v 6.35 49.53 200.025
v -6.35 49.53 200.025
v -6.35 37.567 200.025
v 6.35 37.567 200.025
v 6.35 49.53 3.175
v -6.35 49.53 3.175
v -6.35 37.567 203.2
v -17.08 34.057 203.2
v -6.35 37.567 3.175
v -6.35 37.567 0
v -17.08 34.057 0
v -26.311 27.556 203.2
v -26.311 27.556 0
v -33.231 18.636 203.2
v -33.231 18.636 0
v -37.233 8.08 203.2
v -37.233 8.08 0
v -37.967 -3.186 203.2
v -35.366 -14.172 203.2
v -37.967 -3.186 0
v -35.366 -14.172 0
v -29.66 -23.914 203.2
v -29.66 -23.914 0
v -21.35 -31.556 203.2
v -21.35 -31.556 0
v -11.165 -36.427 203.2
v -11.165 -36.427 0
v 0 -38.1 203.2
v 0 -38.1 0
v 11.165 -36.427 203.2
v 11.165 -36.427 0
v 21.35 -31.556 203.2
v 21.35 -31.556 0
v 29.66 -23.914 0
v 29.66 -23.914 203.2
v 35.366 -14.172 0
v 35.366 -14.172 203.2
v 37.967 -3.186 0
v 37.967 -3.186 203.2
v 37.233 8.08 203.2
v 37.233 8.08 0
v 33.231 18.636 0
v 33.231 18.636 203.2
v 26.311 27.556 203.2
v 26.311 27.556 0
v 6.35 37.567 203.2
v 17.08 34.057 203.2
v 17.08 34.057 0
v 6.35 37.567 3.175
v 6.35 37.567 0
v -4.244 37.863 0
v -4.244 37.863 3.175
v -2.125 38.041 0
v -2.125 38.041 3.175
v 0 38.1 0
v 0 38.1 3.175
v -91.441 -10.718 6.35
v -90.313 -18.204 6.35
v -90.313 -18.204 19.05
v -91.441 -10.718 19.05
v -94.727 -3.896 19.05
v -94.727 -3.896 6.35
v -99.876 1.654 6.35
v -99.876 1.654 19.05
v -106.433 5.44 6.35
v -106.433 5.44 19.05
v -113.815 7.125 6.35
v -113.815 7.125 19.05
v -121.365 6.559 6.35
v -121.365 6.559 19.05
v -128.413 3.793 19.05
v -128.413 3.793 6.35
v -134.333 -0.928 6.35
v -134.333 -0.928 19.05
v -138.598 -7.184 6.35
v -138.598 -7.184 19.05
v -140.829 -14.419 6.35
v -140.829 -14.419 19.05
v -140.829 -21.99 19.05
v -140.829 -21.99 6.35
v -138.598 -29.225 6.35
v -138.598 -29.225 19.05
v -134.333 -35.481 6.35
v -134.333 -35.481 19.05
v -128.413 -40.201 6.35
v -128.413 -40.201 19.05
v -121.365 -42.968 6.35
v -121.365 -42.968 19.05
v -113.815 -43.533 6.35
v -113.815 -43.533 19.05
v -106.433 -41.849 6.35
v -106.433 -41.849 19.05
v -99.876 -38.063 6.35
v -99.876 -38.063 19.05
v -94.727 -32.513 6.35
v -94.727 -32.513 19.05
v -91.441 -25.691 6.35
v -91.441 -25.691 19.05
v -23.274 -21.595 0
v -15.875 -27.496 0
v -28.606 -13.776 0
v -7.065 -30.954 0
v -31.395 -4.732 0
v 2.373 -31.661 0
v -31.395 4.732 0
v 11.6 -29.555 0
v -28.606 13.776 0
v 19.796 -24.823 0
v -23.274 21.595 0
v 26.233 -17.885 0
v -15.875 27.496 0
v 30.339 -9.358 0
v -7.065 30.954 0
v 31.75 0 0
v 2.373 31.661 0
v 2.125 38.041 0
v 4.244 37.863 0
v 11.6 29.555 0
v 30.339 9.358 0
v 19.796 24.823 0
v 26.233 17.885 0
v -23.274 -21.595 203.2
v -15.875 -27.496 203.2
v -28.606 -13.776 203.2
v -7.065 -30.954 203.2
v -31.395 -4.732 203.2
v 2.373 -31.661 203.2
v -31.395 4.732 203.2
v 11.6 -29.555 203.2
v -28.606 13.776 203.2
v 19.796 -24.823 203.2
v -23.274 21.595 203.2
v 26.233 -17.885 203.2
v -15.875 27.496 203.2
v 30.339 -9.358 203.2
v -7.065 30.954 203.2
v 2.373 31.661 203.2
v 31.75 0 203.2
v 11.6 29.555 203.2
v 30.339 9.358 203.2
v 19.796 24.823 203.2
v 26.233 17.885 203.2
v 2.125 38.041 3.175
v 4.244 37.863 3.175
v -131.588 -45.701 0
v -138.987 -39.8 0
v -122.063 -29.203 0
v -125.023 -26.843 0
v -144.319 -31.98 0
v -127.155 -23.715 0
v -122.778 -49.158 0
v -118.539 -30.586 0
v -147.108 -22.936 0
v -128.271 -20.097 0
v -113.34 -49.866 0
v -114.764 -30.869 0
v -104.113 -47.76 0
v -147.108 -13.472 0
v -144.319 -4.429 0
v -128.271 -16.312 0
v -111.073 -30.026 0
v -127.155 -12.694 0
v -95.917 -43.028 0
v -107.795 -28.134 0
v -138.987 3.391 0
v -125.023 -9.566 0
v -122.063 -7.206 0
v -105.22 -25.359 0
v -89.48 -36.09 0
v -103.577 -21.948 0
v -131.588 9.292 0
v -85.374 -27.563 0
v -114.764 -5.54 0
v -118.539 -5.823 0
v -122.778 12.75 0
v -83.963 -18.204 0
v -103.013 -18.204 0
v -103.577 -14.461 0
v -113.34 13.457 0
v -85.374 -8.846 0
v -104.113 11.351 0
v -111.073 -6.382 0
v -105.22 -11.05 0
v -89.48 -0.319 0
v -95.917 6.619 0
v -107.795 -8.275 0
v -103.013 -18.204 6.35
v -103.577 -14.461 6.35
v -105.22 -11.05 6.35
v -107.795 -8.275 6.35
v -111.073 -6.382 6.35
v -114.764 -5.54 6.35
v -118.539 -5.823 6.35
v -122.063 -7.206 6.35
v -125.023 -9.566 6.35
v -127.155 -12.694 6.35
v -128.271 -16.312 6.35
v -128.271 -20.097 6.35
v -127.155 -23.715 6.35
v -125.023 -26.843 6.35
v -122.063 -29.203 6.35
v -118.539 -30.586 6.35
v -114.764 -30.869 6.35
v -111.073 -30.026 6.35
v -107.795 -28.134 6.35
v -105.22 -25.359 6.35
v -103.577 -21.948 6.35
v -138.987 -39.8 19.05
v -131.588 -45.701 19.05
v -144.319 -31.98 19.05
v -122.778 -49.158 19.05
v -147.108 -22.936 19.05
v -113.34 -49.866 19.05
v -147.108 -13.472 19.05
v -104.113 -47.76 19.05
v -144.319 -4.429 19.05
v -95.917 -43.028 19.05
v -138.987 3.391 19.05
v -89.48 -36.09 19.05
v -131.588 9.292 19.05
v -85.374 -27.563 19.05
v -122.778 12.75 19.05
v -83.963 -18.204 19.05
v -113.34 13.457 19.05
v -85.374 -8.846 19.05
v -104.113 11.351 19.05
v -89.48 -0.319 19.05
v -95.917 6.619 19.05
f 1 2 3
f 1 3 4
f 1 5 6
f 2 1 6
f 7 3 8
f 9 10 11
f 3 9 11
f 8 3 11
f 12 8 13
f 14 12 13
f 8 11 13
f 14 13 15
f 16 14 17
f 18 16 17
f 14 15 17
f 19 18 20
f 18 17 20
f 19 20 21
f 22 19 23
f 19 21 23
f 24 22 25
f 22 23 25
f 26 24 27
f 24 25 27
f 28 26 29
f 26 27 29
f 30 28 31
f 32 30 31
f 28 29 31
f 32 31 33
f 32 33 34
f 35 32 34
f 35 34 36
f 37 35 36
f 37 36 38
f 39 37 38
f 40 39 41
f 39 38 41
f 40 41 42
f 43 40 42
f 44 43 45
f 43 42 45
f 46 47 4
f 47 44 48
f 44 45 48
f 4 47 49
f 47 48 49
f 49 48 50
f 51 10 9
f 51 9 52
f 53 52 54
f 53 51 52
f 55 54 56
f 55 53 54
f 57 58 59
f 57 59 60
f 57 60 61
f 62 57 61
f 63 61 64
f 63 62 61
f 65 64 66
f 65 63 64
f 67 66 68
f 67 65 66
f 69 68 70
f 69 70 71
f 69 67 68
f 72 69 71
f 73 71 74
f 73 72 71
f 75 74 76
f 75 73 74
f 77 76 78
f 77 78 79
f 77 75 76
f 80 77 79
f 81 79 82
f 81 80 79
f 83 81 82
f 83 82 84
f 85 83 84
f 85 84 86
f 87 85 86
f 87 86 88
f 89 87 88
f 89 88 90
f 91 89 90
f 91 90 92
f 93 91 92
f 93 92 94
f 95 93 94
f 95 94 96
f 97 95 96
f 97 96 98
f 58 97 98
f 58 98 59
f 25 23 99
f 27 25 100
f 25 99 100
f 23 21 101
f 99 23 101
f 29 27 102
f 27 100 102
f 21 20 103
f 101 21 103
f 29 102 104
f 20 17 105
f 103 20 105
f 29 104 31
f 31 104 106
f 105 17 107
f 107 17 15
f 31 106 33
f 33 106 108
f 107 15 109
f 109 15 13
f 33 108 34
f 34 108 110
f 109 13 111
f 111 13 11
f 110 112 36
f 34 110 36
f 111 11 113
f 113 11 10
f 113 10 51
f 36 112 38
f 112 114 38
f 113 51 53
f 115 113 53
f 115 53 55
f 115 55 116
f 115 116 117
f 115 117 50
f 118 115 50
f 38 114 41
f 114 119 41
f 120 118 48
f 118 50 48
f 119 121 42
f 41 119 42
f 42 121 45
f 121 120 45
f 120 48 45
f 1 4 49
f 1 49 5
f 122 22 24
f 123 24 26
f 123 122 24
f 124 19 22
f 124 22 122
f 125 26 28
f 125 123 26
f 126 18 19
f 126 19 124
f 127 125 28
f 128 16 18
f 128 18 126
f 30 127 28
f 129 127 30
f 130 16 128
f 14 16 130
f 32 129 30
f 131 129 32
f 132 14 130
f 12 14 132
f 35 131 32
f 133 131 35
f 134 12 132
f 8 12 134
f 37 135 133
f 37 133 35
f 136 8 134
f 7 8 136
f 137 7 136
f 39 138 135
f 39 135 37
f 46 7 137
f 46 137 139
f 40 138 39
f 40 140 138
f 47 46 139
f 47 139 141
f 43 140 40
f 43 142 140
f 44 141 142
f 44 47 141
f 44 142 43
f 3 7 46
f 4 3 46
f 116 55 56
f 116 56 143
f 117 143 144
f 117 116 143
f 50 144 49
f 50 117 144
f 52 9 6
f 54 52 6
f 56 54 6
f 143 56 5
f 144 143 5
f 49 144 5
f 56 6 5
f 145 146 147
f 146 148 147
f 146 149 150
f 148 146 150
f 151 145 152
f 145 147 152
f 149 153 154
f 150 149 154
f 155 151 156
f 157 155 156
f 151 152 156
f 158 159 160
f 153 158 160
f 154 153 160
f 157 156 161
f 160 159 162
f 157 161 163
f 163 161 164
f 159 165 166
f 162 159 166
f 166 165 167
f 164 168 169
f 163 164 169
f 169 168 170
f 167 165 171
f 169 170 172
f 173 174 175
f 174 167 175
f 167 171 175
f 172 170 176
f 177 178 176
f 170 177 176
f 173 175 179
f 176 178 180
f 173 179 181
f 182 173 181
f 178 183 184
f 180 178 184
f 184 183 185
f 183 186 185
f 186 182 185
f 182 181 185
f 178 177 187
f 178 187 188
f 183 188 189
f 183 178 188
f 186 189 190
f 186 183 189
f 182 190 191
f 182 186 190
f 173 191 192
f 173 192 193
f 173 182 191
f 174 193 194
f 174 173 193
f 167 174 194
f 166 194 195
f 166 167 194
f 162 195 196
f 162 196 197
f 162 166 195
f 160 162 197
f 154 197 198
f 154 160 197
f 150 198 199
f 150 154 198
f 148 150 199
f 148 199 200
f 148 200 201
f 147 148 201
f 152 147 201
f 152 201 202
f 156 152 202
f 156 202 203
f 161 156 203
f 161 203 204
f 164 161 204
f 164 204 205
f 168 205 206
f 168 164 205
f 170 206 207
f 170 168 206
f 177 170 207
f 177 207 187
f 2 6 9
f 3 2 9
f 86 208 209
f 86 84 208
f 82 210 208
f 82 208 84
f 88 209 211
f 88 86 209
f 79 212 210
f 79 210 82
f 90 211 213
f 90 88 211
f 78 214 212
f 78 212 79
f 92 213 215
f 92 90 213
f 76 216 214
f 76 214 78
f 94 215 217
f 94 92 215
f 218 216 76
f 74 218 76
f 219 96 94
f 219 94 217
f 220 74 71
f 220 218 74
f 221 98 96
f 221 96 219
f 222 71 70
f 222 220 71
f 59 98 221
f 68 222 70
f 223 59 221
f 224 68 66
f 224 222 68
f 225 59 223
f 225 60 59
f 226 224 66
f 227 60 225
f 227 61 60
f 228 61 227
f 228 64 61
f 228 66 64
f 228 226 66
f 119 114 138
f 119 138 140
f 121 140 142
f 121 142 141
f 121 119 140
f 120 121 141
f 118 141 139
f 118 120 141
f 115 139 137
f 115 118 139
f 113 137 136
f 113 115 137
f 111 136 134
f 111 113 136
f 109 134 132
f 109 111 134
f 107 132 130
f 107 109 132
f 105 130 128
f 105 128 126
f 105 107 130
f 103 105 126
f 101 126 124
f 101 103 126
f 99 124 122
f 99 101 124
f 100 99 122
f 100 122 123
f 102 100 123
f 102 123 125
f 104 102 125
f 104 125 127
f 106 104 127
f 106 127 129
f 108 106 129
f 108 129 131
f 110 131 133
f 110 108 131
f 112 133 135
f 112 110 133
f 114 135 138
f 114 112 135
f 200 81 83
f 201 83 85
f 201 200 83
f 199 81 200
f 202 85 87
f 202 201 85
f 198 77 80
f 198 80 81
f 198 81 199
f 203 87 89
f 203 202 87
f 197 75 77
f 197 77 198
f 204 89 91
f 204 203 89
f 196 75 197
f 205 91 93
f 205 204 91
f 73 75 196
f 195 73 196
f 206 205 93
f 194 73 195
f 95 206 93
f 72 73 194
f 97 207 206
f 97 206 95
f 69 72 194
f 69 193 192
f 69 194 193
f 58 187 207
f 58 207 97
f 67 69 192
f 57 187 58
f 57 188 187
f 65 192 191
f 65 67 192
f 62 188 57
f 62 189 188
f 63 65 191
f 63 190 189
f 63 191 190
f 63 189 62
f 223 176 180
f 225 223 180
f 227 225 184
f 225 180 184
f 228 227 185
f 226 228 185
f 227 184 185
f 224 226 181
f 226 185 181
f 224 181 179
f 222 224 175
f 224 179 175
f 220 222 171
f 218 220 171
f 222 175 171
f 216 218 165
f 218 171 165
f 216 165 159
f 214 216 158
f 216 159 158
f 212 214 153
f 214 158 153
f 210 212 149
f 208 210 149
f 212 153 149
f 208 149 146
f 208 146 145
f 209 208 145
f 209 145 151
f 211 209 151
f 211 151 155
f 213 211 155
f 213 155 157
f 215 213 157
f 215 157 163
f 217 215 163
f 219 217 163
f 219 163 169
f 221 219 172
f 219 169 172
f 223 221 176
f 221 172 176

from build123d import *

# Parameters (mm, degrees)
F0_R     = 31.75
F0_R_2   = 25.4
F1_DEPTH = 19.05
F0_R_3   = 12.7
F2_DEPTH = 6.35
F3_DEPTH = 203.2
F4_W     = 12.7
F4_H     = 11.9628933773
F5_DEPTH = 3.175
F6_DEPTH = 3.175


# Not quite as in the source:
# - a feature names something its author has since deleted; it is built from what else it names


with BuildPart() as f1:
    # F0 (on Top) → F1 (new body)
    with BuildSketch(Plane.XY):
        with Locations((-115.7130011189, -18.2043969423)):
            Circle(F0_R)
        with Locations((-115.7130011189, -18.2043969423)):
            Circle(F0_R_2, mode=Mode.SUBTRACT)
    extrude(amount=F1_DEPTH)

    # F0 (on Top) → F2 (join)
    with BuildSketch(Plane.XY):
        with Locations((-115.7130011189, -18.2043969423)):
            Circle(F0_R_2)
        with Locations((-115.7130011189, -18.2043969423)):
            Circle(F0_R_3, mode=Mode.SUBTRACT)
    extrude(amount=F2_DEPTH)


with BuildPart() as f3:
    # F0 (on Top) → F3 (new body)
    with BuildSketch(Plane.XY):
        with BuildLine():
            ThreePointArc((-6.35, 37.5671066227), (-24.5934442484, -29.099355663), (38.1, 0))
            ThreePointArc((38.1, 0), (29.099355663, 24.5934442484), (6.35, 37.5671066227))
            ThreePointArc((6.35, 37.5671066227), (3.1861605167, 37.9665429182), (0, 38.1))
            ThreePointArc((0, 38.1), (-3.1861605167, 37.9665429182), (-6.35, 37.5671066227))
        make_face()
        Circle(F0_R, mode=Mode.SUBTRACT)
        with BuildLine():
            ThreePointArc((0, 38.1), (3.1861605167, 37.9665429182), (6.35, 37.5671066227))
            Line((6.35, 37.5671066227), (6.35, 49.53))
            Line((6.35, 49.53), (0, 49.53))
            Line((0, 49.53), (0, 38.1))
        make_face()
        with BuildLine():
            Line((-6.35, 49.53), (-6.35, 37.5671066227))
            ThreePointArc((-6.35, 37.5671066227), (-3.1861605167, 37.9665429182), (0, 38.1))
            Line((0, 38.1), (0, 49.53))
            Line((0, 49.53), (-6.35, 49.53))
        make_face()
    extrude(amount=F3_DEPTH)

    # F4 (on face) → F5 (cut)
    with BuildSketch(Plane.XY.offset(203.2)):
        with Locations((0, 43.5485533113)):
            Rectangle(F4_W, F4_H)
    extrude(amount=-F5_DEPTH, mode=Mode.SUBTRACT)

    # F0 (on Top) → F6 (cut)
    with BuildSketch(Plane.XY):
        with BuildLine():
            ThreePointArc((0, 38.1), (3.1861605167, 37.9665429182), (6.35, 37.5671066227))
            Line((6.35, 37.5671066227), (6.35, 49.53))
            Line((6.35, 49.53), (0, 49.53))
            Line((0, 49.53), (0, 38.1))
        make_face()
        with BuildLine():
            Line((-6.35, 49.53), (-6.35, 37.5671066227))
            ThreePointArc((-6.35, 37.5671066227), (-3.1861605167, 37.9665429182), (0, 38.1))
            Line((0, 38.1), (0, 49.53))
            Line((0, 49.53), (-6.35, 49.53))
        make_face()
    extrude(amount=F6_DEPTH, mode=Mode.SUBTRACT)


solid = Compound([f1.part, f3.part])
